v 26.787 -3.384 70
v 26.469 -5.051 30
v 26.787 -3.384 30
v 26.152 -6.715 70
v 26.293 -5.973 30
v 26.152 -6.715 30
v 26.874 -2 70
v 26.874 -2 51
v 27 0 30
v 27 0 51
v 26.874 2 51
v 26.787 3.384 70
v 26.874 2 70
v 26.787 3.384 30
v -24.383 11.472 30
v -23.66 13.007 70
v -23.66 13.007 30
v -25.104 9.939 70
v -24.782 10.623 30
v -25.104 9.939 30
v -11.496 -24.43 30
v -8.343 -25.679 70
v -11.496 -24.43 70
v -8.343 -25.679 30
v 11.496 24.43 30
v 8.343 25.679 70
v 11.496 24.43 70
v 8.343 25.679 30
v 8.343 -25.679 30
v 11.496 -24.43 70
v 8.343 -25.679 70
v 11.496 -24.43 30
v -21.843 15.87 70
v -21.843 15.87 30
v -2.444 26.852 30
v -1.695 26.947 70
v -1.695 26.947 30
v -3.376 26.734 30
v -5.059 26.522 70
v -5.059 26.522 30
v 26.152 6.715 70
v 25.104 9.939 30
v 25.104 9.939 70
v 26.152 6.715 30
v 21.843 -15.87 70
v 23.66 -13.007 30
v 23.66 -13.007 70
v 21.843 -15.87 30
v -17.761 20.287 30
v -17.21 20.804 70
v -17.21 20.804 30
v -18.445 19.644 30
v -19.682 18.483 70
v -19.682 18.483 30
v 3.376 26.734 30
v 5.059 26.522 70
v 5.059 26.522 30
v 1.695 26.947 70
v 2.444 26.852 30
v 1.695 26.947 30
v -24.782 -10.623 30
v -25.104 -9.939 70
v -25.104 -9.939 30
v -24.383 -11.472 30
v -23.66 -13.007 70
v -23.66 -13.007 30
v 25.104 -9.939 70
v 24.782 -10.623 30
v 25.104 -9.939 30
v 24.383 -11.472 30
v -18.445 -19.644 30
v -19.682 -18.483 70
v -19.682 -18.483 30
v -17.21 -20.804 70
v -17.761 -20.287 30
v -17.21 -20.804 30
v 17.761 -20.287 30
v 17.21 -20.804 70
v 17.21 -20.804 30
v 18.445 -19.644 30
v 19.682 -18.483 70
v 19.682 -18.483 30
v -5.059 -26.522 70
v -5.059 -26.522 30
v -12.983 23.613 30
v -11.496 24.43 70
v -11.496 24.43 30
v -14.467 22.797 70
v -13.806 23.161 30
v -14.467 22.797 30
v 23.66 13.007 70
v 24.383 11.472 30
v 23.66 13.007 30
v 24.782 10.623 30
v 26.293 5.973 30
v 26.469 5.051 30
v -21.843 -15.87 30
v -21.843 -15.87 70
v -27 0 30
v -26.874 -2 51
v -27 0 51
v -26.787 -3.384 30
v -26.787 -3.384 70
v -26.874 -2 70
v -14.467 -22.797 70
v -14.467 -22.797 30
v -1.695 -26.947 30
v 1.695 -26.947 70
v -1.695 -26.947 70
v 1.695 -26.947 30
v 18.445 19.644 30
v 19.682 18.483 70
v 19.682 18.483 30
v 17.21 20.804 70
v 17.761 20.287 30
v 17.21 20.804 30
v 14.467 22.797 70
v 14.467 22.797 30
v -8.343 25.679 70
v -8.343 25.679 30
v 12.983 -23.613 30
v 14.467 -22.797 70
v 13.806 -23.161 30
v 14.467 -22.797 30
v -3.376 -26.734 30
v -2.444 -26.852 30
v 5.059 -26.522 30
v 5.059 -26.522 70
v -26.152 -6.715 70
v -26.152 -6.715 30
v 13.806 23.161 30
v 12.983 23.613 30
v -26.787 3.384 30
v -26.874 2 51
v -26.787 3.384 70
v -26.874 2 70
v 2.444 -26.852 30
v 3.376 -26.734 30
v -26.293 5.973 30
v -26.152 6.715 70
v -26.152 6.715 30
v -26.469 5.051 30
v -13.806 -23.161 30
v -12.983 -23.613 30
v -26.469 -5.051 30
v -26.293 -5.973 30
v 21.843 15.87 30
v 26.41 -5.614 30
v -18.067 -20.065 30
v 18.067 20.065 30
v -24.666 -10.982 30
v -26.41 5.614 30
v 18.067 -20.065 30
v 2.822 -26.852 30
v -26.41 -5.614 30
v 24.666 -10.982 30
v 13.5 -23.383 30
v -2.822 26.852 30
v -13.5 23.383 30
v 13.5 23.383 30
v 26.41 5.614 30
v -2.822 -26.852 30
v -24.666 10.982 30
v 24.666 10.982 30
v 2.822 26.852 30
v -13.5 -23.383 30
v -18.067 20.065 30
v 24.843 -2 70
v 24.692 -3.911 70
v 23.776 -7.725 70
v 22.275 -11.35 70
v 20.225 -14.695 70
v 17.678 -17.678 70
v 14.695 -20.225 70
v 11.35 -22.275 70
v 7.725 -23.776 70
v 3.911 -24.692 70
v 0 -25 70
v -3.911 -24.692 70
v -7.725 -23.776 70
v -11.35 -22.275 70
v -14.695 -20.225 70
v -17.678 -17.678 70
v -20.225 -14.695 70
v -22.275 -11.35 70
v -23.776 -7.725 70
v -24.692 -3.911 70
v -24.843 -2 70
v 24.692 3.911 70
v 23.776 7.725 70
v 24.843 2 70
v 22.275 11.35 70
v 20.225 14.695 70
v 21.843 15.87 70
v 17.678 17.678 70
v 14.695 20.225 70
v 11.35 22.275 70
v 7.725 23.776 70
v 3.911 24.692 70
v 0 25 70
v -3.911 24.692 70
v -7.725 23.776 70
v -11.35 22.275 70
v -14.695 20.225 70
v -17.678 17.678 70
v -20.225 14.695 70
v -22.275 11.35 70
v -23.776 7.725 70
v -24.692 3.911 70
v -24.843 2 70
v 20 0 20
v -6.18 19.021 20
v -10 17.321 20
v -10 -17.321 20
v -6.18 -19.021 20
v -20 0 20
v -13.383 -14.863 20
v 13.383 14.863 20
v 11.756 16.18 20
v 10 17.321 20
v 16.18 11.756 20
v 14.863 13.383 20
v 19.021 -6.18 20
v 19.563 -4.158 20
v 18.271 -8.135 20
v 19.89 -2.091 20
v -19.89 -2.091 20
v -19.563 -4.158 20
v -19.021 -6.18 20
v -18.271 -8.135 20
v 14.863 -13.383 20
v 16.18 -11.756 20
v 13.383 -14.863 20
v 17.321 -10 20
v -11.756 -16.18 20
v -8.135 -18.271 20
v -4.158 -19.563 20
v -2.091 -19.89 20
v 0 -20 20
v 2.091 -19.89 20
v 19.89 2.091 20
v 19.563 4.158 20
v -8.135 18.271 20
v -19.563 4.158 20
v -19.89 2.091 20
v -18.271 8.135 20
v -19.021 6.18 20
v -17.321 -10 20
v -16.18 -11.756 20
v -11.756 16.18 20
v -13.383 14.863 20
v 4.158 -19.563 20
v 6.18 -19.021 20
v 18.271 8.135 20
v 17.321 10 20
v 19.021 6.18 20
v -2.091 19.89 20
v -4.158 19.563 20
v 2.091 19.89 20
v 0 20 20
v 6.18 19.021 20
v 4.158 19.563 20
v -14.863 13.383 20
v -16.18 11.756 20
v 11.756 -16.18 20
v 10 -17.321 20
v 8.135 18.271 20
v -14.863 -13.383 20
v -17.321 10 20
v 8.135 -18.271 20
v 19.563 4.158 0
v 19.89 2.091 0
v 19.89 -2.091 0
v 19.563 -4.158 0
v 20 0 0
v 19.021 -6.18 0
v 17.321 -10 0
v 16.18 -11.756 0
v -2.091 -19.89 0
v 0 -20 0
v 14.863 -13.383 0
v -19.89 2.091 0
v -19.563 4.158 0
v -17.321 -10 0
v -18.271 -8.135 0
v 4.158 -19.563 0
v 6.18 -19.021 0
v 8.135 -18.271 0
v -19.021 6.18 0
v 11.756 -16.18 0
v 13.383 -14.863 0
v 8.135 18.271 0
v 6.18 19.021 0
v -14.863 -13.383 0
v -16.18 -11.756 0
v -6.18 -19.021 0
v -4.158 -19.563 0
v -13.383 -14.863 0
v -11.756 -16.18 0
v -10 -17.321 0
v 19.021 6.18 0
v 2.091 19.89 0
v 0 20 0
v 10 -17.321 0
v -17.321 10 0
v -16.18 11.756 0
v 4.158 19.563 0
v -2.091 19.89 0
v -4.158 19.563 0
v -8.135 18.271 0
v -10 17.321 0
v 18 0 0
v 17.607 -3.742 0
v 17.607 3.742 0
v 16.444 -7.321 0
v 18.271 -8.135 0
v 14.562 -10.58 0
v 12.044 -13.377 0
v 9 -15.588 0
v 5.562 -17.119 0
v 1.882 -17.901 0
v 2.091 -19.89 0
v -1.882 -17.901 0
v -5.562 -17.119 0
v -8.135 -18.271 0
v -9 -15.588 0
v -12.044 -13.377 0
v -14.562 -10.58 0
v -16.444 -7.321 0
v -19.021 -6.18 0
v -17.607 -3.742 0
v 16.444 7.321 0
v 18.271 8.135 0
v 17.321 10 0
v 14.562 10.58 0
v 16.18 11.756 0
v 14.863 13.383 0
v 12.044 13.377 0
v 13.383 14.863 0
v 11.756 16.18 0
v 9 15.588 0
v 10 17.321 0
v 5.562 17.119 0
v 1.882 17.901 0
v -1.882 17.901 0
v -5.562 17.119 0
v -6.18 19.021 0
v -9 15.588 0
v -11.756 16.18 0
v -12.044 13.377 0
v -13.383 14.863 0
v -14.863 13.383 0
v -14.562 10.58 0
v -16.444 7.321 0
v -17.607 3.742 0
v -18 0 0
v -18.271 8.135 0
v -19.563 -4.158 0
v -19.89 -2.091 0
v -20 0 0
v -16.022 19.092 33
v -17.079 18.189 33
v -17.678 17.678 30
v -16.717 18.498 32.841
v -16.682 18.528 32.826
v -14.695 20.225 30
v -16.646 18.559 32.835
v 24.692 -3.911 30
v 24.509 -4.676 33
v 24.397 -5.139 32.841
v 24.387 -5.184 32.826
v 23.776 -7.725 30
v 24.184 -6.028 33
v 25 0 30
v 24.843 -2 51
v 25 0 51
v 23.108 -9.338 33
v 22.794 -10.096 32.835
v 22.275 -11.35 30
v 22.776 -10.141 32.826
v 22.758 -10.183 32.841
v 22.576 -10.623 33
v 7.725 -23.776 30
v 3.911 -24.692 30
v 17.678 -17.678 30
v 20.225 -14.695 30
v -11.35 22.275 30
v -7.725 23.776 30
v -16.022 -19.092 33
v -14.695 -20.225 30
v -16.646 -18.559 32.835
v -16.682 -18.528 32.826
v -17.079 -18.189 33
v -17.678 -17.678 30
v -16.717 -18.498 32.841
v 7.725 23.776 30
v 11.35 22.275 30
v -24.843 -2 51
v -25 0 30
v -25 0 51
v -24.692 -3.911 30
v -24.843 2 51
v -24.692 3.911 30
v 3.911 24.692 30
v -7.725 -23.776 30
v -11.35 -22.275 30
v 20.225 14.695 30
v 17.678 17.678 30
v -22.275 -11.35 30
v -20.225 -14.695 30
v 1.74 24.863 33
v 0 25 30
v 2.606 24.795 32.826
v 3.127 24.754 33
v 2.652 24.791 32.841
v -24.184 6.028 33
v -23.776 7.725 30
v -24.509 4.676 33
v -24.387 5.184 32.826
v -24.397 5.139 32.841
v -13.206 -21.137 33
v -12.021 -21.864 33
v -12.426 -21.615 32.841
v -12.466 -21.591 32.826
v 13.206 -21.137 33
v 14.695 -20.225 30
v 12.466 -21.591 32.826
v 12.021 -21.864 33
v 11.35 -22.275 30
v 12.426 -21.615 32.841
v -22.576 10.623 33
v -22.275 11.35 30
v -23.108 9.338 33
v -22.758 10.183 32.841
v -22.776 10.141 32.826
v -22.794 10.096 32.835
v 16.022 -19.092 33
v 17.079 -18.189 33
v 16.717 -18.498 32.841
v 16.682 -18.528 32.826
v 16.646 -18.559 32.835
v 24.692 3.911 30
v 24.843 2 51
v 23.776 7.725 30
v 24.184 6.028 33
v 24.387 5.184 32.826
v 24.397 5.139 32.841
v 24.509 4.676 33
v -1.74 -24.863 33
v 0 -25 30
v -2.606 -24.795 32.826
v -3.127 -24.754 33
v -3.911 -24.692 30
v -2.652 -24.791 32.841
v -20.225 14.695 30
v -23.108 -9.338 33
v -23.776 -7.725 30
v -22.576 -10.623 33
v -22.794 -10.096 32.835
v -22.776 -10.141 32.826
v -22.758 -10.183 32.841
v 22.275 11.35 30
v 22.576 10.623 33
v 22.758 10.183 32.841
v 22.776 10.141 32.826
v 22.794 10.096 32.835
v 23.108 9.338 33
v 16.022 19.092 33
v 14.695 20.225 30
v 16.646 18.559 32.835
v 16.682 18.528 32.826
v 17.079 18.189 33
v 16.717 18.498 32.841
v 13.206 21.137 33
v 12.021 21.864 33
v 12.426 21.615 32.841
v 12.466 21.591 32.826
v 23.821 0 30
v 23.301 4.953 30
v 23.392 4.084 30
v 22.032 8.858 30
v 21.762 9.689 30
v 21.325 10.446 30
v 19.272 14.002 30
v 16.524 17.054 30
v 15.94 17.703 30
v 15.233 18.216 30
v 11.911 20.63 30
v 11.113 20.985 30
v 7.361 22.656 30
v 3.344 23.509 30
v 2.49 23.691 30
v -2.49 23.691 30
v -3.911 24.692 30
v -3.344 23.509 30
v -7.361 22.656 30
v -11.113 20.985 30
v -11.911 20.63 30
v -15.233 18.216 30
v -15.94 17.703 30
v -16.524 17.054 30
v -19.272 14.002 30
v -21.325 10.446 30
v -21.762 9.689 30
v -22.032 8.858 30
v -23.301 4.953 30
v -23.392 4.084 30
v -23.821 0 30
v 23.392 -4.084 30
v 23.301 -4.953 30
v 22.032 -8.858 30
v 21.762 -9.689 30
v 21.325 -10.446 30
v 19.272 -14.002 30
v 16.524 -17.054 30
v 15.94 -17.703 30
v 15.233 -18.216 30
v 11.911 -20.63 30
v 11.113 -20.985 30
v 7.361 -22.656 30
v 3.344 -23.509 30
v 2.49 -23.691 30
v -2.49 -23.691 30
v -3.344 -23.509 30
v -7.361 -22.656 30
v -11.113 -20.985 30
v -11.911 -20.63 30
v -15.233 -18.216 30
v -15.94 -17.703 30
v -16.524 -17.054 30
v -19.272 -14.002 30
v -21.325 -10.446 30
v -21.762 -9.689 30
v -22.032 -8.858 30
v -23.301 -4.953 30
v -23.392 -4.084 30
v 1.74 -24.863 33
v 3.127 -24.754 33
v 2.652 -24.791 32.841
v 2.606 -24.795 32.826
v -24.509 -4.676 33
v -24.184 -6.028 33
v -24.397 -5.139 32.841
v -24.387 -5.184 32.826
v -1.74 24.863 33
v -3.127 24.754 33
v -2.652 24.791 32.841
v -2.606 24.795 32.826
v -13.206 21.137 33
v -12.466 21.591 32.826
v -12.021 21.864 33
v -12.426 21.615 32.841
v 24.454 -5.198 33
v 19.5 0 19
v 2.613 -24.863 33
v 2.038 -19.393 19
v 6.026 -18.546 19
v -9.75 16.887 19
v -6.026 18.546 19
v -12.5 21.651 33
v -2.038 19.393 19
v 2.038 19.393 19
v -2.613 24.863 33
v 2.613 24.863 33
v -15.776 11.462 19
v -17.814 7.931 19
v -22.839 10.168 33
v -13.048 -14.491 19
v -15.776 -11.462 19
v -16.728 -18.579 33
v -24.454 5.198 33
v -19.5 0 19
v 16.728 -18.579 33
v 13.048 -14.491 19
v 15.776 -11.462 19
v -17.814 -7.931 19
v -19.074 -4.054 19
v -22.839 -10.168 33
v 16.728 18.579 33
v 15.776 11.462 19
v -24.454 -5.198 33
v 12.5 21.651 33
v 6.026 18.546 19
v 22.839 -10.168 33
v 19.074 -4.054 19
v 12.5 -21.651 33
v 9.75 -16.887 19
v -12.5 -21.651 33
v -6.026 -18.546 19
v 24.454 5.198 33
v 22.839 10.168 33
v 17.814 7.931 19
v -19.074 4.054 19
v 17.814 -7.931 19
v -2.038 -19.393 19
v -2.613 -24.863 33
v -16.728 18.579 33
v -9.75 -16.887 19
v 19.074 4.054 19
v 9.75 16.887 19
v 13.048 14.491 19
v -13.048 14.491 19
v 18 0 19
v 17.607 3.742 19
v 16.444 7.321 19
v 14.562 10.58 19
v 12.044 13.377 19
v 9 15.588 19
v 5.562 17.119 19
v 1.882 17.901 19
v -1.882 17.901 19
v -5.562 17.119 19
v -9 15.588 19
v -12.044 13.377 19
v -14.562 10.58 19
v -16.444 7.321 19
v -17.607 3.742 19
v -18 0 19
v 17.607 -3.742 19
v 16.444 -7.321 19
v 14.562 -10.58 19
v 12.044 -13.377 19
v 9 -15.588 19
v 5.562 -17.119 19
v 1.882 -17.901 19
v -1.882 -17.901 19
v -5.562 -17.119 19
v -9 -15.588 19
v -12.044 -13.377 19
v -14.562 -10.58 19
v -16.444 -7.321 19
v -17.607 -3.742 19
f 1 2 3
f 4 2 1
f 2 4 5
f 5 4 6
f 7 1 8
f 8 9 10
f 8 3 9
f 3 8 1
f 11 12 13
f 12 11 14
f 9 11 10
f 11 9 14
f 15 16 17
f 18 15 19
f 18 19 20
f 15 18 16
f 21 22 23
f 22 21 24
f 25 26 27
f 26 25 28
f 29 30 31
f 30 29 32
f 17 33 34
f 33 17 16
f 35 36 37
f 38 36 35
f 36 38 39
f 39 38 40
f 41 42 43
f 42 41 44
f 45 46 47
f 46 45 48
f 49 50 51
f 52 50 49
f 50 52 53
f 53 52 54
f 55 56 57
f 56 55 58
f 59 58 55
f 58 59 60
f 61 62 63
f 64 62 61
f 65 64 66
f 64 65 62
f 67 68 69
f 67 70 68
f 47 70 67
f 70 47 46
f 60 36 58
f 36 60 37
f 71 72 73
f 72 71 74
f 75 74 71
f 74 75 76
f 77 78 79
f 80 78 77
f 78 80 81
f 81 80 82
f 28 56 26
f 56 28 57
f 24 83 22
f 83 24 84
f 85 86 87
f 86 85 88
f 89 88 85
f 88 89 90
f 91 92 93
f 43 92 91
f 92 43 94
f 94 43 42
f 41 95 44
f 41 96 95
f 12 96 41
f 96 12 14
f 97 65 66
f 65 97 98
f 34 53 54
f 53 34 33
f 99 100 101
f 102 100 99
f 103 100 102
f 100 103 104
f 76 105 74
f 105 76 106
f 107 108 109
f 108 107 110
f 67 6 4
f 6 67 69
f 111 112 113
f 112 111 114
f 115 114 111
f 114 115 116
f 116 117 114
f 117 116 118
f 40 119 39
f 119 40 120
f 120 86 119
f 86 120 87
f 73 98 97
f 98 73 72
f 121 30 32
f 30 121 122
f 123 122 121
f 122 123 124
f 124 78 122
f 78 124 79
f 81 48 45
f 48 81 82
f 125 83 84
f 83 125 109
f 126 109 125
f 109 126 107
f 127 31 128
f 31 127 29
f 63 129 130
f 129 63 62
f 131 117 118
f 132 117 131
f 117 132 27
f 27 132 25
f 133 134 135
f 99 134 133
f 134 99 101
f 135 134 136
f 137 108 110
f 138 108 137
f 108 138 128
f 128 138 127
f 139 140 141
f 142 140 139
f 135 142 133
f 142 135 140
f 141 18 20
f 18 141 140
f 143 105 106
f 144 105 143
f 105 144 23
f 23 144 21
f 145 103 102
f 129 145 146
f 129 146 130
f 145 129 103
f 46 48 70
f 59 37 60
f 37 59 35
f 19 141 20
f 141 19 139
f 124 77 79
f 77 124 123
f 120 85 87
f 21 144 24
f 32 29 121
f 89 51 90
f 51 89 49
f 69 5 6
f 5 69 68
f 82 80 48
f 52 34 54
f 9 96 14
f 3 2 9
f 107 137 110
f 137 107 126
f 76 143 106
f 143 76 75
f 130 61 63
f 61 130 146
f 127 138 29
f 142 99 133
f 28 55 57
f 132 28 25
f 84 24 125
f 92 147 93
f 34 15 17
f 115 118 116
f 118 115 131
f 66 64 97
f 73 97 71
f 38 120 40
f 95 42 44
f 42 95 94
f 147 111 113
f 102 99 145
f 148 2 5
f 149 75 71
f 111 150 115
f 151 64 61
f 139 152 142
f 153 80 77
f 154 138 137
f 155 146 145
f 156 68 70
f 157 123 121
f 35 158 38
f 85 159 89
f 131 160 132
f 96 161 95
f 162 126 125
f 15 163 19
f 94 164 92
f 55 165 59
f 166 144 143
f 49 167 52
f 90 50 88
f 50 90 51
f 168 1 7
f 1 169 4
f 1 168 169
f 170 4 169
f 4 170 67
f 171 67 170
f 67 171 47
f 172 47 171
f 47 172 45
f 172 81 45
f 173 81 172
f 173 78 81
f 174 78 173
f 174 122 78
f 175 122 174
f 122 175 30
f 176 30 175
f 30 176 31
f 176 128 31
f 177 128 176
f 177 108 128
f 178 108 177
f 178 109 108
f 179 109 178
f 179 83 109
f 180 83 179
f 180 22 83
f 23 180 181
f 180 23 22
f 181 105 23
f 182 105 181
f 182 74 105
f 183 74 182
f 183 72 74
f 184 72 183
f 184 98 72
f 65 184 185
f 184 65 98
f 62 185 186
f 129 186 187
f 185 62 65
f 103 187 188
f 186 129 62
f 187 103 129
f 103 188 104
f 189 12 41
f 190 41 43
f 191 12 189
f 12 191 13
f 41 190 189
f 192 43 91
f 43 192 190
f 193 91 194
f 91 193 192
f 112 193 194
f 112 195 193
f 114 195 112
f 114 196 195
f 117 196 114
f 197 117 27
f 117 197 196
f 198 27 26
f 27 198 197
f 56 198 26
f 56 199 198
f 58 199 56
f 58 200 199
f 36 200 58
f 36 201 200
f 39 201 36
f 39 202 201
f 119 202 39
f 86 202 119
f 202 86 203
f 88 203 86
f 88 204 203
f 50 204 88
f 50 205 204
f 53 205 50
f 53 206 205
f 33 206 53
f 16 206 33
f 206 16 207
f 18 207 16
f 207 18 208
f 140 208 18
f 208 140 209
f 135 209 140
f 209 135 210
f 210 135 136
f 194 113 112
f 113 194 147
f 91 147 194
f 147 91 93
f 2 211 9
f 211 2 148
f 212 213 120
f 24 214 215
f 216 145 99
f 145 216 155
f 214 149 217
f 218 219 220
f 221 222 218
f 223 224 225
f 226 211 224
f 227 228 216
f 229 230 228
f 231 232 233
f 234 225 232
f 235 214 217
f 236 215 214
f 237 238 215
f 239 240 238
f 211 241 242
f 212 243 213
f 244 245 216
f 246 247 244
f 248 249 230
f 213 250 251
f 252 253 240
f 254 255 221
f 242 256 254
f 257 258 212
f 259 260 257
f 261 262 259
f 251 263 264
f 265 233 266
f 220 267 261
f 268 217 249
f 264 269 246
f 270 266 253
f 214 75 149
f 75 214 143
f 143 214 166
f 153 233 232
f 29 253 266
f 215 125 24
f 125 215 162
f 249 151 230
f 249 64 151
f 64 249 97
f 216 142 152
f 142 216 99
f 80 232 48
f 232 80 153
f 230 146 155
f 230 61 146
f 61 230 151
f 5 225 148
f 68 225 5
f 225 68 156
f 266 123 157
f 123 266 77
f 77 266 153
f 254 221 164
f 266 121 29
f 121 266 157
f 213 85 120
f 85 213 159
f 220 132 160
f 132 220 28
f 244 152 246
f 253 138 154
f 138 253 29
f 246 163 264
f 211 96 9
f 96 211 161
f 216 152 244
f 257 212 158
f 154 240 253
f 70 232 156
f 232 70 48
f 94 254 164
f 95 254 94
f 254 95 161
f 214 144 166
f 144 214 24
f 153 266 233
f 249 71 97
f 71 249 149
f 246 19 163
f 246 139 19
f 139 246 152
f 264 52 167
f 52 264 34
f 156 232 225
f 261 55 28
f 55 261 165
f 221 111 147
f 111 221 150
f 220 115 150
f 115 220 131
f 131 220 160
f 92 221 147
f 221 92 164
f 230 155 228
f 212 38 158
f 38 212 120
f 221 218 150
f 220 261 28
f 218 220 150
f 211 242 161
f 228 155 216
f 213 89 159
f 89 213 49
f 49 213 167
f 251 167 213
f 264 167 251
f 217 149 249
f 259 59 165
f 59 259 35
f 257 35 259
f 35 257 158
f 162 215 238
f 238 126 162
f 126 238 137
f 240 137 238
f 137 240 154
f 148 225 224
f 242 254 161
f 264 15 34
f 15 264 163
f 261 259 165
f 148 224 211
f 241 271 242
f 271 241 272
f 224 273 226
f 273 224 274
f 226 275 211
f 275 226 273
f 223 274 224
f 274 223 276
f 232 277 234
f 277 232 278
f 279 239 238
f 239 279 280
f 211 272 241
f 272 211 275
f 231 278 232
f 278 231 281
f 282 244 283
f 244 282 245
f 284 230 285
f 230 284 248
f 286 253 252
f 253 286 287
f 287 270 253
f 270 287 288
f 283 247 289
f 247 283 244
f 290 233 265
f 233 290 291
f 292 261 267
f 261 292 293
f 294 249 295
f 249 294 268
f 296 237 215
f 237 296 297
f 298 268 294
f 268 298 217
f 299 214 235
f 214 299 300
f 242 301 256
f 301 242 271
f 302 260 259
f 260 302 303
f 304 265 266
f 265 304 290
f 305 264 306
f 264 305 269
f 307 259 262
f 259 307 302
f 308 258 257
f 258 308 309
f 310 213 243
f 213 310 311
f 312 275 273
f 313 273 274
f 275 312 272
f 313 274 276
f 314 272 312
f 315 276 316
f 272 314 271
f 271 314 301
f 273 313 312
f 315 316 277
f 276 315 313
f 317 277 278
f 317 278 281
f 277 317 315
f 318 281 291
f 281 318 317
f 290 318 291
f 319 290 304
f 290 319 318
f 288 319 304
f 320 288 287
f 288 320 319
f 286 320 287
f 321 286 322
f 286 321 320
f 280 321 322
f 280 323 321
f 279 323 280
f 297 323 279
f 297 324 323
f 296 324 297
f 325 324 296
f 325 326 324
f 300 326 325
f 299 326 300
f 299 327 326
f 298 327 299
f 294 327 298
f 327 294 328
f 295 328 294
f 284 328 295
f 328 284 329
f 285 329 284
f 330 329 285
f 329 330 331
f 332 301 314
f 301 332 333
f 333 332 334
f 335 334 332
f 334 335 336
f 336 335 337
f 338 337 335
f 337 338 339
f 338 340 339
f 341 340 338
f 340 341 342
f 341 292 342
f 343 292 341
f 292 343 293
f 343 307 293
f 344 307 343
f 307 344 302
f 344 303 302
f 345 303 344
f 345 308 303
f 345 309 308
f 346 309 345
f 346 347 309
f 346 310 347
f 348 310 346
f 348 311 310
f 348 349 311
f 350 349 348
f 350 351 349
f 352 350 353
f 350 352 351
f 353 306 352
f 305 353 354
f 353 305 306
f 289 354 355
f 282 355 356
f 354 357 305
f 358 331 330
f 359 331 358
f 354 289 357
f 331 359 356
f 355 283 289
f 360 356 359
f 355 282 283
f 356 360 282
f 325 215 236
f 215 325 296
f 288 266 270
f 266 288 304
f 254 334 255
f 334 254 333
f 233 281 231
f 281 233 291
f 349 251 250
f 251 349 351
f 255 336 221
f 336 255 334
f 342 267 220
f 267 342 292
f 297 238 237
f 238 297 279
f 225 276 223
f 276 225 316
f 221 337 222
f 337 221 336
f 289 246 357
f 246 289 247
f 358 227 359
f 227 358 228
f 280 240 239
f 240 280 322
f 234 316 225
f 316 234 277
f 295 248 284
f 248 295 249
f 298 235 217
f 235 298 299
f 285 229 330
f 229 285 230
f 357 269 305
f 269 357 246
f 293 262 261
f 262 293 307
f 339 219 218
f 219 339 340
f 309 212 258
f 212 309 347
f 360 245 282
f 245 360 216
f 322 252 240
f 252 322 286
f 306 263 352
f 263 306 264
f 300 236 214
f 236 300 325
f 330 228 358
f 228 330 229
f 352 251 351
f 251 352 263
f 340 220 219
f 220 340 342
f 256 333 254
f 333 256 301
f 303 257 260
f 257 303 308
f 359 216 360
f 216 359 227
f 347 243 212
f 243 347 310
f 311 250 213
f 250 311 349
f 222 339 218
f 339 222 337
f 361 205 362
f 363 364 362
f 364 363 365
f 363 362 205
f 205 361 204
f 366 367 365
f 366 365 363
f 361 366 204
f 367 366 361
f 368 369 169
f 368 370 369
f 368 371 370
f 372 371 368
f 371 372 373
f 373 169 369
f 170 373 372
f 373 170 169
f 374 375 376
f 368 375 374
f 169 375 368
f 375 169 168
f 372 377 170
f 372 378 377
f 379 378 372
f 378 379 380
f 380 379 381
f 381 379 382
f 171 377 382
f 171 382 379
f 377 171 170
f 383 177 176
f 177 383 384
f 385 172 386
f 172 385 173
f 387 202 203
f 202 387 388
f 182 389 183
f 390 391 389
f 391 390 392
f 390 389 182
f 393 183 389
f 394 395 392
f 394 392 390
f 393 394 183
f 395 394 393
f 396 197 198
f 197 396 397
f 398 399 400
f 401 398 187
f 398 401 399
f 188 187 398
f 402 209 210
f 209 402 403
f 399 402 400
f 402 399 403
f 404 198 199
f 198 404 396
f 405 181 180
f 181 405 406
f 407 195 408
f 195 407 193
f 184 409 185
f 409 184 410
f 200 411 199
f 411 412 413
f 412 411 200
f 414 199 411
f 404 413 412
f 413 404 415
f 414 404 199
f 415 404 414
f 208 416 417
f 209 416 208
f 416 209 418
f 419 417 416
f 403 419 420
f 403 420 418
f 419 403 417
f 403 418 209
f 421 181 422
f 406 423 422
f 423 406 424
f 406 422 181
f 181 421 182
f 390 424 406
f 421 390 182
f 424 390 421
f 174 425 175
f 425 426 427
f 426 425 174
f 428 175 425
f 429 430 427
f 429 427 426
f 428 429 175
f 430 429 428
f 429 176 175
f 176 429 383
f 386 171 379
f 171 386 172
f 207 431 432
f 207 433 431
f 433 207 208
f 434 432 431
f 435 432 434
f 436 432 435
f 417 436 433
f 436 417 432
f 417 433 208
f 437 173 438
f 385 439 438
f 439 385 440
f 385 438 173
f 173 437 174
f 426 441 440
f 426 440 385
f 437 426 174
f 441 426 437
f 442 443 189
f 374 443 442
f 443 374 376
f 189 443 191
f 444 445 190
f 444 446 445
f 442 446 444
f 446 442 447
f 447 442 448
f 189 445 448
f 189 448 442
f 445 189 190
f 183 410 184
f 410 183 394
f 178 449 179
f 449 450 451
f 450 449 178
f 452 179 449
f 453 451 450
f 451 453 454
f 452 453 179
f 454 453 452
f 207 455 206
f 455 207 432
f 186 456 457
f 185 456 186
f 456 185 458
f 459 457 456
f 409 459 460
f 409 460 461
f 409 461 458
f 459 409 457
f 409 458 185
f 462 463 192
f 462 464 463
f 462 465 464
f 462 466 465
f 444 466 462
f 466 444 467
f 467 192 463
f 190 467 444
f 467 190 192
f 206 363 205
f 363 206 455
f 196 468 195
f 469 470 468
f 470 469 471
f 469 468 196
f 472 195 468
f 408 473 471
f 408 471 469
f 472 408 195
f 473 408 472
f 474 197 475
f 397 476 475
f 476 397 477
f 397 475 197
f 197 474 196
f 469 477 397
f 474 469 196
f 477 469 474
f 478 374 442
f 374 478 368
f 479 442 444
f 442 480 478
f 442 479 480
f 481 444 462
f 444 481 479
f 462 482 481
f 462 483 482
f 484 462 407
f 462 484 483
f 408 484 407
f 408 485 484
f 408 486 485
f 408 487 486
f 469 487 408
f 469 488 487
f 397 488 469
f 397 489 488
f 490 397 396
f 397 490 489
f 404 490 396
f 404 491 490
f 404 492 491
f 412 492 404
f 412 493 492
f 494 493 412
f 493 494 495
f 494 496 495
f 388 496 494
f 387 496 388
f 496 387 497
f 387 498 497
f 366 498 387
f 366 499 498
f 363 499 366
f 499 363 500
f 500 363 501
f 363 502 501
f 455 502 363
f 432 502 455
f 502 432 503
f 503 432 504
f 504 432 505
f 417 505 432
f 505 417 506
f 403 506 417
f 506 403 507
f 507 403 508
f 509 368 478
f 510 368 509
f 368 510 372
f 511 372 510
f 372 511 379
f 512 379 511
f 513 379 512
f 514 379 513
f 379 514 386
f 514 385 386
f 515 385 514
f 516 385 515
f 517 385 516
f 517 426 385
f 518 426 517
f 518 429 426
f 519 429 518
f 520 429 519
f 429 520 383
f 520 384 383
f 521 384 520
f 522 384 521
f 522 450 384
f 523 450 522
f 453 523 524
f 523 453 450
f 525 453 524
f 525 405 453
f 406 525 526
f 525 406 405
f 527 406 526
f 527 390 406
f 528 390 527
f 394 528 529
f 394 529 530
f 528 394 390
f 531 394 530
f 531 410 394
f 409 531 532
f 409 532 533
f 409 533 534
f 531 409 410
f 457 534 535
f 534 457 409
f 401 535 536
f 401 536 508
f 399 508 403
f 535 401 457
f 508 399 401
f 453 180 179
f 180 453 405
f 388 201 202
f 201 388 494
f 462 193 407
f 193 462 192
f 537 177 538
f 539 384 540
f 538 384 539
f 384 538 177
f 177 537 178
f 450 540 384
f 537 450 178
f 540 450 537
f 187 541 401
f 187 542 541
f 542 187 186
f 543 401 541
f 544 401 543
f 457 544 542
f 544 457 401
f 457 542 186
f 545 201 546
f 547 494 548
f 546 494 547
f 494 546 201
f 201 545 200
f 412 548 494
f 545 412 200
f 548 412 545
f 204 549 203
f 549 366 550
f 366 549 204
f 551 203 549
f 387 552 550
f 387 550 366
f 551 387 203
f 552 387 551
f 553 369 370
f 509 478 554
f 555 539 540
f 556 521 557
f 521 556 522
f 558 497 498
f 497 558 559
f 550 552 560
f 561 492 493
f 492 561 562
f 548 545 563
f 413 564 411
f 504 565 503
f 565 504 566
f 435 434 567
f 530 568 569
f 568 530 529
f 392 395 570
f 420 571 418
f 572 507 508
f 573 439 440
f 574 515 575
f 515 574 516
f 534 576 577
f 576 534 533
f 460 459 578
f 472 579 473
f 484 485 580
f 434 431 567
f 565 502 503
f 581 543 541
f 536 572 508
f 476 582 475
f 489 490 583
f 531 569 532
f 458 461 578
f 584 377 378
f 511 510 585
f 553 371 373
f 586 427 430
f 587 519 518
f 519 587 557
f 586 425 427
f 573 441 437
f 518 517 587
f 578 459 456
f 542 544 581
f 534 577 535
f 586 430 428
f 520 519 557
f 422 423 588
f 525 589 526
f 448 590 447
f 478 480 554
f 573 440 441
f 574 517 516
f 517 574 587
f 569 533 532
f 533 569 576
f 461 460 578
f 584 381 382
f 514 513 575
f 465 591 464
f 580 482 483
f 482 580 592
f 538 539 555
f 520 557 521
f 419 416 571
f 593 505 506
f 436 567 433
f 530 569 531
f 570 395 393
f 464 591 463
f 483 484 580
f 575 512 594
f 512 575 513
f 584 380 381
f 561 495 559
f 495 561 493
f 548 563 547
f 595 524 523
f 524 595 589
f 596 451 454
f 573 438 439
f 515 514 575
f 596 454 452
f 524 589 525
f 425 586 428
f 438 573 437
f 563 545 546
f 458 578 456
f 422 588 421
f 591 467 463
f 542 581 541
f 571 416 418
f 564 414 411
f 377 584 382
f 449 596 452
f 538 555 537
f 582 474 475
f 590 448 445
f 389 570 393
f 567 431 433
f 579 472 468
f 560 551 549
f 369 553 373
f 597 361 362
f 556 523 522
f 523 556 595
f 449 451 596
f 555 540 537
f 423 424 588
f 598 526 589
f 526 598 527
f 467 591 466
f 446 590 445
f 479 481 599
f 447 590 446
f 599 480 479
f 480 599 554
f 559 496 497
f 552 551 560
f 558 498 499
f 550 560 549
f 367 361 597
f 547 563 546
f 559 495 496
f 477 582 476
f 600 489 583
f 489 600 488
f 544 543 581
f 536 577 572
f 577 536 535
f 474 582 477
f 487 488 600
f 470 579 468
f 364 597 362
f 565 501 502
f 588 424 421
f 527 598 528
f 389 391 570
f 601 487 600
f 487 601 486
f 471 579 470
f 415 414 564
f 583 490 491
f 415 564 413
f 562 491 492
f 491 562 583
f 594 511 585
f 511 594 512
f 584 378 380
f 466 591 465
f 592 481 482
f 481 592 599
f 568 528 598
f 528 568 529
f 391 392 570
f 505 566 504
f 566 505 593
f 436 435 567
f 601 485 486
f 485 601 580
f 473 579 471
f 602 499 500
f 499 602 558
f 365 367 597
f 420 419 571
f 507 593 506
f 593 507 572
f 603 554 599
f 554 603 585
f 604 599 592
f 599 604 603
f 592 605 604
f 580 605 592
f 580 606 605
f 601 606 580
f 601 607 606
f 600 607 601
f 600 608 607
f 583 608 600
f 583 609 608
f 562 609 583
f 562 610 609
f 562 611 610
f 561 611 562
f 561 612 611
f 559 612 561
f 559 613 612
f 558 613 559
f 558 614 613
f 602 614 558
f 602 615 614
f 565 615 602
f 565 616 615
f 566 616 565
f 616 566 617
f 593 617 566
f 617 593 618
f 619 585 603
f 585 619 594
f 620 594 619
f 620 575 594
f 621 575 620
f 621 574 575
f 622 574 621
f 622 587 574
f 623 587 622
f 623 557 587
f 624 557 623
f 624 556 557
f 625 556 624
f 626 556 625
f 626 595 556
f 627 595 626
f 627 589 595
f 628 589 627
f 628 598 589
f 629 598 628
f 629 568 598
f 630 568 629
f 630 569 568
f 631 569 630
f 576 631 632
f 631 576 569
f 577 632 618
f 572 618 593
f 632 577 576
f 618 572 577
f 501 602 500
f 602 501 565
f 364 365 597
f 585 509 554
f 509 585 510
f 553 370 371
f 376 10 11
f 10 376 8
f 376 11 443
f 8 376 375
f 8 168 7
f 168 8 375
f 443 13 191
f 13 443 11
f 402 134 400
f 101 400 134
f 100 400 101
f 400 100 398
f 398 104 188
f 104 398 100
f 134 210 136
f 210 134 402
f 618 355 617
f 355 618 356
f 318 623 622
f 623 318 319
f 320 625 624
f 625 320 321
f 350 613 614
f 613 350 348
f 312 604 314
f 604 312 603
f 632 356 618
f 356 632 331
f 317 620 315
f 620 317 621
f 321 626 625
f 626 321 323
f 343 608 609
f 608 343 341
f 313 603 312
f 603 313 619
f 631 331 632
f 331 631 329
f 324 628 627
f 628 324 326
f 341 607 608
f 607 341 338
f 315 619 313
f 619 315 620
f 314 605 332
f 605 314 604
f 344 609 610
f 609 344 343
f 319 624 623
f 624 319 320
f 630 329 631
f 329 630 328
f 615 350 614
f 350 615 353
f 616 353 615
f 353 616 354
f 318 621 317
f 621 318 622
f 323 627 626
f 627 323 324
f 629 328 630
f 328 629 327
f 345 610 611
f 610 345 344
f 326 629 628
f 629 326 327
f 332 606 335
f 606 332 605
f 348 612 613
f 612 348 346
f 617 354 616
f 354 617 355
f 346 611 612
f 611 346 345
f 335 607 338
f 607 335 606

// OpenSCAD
scope_dia = 50;
insert_length = 40;
pipe_outside_diameter = 43;
pipe_inside_diameter = 40;

module scope_adapter(){
difference(){
union(){

//create main scope eye piece tube
cylinder(r=(scope_dia + 4)/2,h=insert_length,$fn=50);

//create taper between eye piece and spigot
translate([0,0,insert_length]) cylinder(r1=(scope_dia+4)/2,r2=pipe_inside_diameter/2,h=10);

//create spigot for gluing inside 40mm solvent weld waste pipe 
translate([0,0,insert_length+10]) cylinder(r=pipe_inside_diameter/2,h=20,$fn=60);
}

//create socket for scope eye piece
translate([0,0,-2]) cylinder(r=(scope_dia)/2,h=insert_length+2,$fn=40);

//hollow out taper section
translate([0,0,insert_length-3]) cylinder(r1=(scope_dia)/2,r2=(pipe_outside_diameter-4)/2,h=14);

//create a couple of cut out for a bit of give
translate([scope_dia/2-1,-2,-1]) cube([4,4,insert_length/2]);
translate([-scope_dia/2-3,-2,-1]) cube([4,4,insert_length/2]);

//create hole through top spigot
translate([0,0,insert_length+10]) cylinder(r=(pipe_inside_diameter-4)/2,h=25);
}
}

//generate model and flip upside down for easier printing
translate([0,0,insert_length+30]) rotate([180,0,0]) scope_adapter();
